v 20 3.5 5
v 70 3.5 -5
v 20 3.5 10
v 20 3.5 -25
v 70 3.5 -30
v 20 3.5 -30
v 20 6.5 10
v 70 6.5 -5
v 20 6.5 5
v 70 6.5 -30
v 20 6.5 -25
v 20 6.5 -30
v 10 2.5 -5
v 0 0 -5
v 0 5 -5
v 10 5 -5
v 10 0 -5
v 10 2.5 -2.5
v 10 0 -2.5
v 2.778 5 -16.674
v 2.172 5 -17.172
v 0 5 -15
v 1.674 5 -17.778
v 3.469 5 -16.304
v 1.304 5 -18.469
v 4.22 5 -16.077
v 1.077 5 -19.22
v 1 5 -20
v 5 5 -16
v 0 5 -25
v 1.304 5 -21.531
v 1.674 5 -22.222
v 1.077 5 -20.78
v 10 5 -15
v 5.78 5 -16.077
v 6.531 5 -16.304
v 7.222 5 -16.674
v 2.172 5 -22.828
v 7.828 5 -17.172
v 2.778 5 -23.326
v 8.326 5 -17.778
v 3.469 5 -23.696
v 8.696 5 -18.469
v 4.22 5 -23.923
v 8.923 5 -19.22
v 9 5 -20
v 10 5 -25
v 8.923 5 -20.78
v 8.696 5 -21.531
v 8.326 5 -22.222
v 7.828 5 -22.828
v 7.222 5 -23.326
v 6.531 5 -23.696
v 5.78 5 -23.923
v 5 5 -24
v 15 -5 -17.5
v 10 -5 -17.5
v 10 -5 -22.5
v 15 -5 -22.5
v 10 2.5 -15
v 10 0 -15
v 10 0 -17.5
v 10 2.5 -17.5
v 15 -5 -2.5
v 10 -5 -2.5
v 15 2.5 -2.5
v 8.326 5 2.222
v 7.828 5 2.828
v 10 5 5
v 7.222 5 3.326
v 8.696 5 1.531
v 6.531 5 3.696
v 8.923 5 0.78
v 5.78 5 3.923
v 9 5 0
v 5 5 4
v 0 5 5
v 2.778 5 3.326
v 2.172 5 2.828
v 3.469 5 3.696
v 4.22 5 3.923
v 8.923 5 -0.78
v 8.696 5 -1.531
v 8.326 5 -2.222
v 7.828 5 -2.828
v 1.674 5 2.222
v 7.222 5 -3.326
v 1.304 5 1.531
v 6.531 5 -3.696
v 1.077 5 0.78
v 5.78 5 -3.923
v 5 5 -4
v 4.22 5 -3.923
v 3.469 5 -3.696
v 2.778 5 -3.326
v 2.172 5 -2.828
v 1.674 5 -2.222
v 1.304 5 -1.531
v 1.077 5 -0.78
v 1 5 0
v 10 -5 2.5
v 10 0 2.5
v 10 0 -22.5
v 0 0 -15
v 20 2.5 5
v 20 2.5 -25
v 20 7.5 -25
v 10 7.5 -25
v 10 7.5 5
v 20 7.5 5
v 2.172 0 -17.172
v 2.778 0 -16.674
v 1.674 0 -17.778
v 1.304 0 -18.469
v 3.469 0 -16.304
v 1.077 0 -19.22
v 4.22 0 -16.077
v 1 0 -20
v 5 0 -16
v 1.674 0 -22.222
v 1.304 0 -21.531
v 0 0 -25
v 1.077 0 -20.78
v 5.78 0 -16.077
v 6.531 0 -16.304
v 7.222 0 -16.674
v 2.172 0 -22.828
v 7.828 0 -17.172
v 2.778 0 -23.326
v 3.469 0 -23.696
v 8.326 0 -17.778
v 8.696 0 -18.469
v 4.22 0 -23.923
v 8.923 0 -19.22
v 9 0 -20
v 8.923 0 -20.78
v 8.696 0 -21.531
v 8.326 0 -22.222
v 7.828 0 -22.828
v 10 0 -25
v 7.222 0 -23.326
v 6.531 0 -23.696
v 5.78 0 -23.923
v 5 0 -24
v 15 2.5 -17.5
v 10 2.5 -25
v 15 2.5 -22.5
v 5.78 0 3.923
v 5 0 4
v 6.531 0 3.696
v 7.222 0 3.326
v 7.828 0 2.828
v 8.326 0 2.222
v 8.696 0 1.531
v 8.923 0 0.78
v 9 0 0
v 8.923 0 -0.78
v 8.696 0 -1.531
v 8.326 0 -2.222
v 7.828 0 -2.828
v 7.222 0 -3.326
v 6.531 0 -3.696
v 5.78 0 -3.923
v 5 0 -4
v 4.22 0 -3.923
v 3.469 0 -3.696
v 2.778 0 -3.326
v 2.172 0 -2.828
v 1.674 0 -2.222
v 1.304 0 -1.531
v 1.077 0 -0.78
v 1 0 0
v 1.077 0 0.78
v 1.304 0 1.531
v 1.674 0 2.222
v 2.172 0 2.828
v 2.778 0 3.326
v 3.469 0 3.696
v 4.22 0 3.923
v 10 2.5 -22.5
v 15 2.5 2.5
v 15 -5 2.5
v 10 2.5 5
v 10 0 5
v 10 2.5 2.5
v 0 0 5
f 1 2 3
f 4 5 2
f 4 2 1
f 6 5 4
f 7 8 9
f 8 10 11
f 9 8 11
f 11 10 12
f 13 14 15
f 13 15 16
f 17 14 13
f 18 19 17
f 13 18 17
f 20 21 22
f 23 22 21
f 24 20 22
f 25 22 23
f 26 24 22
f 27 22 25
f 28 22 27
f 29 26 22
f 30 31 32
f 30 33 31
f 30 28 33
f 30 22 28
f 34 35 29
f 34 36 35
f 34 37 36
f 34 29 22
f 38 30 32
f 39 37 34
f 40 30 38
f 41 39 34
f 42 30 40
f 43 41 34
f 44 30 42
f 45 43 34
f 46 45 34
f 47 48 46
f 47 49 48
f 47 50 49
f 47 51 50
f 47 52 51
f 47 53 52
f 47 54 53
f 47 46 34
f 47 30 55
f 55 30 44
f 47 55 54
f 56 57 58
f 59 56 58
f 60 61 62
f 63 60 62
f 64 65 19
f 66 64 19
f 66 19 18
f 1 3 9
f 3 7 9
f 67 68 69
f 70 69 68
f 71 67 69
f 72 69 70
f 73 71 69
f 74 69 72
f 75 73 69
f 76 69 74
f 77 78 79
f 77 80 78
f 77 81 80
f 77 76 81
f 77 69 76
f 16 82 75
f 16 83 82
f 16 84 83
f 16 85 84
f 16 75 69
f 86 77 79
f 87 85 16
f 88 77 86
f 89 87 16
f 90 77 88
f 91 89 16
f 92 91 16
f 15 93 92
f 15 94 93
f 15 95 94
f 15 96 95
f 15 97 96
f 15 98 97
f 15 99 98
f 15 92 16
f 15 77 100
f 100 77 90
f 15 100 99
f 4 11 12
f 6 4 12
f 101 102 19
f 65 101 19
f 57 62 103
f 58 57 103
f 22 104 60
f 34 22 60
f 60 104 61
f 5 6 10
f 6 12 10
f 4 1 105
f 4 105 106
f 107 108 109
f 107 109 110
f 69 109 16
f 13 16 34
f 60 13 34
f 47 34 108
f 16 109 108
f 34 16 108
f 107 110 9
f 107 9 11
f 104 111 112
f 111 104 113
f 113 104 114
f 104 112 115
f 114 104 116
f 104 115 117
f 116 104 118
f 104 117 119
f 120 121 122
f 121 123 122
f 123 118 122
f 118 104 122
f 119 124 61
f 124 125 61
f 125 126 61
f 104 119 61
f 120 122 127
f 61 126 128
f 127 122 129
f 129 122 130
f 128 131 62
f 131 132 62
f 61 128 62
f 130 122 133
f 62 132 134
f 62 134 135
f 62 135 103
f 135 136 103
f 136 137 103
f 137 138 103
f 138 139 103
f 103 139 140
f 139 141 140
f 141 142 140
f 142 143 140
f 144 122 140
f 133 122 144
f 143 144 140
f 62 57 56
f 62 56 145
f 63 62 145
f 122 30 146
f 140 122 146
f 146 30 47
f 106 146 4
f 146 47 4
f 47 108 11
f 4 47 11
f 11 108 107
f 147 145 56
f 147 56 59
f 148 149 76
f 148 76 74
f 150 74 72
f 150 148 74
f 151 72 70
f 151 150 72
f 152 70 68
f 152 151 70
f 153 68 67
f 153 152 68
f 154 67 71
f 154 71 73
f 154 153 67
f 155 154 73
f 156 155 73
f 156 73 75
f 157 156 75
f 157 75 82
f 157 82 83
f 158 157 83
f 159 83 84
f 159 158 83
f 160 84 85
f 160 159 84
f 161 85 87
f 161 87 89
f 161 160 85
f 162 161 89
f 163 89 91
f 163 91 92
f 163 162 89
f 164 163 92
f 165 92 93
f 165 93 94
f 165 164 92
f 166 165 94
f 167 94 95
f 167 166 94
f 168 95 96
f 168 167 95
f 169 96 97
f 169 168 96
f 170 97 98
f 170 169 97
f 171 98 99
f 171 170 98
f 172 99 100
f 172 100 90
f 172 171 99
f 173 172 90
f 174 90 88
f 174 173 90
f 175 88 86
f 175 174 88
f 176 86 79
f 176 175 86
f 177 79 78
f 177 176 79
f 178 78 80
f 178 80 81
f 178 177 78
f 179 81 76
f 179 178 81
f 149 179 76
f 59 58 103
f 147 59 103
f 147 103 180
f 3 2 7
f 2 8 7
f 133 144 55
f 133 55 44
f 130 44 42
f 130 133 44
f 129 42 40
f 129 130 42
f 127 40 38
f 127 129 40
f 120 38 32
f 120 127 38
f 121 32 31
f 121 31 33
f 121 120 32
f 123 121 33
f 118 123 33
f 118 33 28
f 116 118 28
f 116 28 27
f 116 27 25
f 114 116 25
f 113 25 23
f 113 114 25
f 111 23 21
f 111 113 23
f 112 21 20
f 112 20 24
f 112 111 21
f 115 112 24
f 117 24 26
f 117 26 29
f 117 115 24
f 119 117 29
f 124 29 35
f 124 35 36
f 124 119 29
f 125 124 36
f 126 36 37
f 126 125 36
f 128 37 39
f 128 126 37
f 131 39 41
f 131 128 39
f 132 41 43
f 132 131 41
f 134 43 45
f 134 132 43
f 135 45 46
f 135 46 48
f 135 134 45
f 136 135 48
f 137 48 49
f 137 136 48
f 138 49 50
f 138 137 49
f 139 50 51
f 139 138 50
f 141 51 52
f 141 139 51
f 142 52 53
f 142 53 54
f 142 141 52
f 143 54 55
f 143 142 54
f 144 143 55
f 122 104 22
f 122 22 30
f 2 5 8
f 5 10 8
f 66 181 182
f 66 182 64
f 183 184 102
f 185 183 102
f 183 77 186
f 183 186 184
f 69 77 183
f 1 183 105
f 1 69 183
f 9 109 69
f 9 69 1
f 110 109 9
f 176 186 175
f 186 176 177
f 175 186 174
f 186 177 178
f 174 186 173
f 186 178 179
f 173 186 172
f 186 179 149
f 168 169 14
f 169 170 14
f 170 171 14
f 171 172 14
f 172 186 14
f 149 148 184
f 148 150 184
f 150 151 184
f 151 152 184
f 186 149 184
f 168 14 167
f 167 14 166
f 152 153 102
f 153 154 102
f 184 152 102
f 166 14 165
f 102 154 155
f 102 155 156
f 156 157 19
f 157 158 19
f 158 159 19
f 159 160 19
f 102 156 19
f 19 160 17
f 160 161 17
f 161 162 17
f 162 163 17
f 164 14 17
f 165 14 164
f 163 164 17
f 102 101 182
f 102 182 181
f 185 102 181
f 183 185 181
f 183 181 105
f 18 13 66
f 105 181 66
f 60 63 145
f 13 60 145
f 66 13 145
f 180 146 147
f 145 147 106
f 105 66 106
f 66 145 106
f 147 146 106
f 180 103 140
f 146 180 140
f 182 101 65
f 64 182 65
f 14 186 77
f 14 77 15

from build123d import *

# Parameters (mm, degrees)
SKETCH1_W             = 10
SKETCH1_H             = 10
SKETCH1_R             = 4
BOSS_EXTRUDE1_DEPTH   = 5
BOSS_EXTRUDE1_2_DEPTH = 5
SKETCH2_W             = 5
SKETCH2_H             = 10
BOSS_EXTRUDE2_DEPTH   = 5
SKETCH4_W             = 10
SKETCH4_H             = 30
BOSS_EXTRUDE4_DEPTH   = 2.5
BOSS_EXTRUDE7_DEPTH   = 1.5


with BuildPart() as part:
    # Sketch1 → Boss-Extrude1 (new body)
    with BuildSketch(Plane(origin=(0, 0, 0), x_dir=(1, 0, 0), z_dir=(0, 1, 0))):
        with Locations((5, 0)):
            Rectangle(SKETCH1_W, SKETCH1_H)
        with Locations(Location((5, 0, 0), (0, 0, 270))):
            Circle(SKETCH1_R, mode=Mode.SUBTRACT)
    extrude(amount=BOSS_EXTRUDE1_DEPTH)

    # Sketch2 → Boss-Extrude2 (add)
    with BuildSketch(Plane(origin=(10, 0, 0), x_dir=(0, 0, -1), z_dir=(1, 0, 0))):
        Rectangle(SKETCH2_W, SKETCH2_H)
        with Locations((20, 0)):
            Rectangle(SKETCH2_W, SKETCH2_H)
    extrude(amount=BOSS_EXTRUDE2_DEPTH)


with BuildPart() as body_2:
    # Sketch1 → Boss-Extrude1 2 (new body)
    with BuildSketch(Plane(origin=(0, 0, 0), x_dir=(1, 0, 0), z_dir=(0, 1, 0))):
        with Locations((5, 20)):
            Rectangle(SKETCH1_W, SKETCH1_H)
        with Locations(Location((5, 20, 0), (0, 0, 90))):
            Circle(SKETCH1_R, mode=Mode.SUBTRACT)
    extrude(amount=BOSS_EXTRUDE1_2_DEPTH)



with BuildPart() as boss_extrude2_piece_1:
    # of the separate pieces the step leaves, piece 1, a body of its own (boss_extrude2_pieces)
    add(part.part.solids().sort_by_distance((0, 0, -5))[0])

    # Sketch4 → Boss-Extrude4 (add, symmetric)
    with BuildSketch(Plane(origin=(0, 5, 0), x_dir=(1, 0, 0), z_dir=(0, 1, 0))):
        with Locations((15, 10)):
            Rectangle(SKETCH4_W, SKETCH4_H)
    extrude(amount=BOSS_EXTRUDE4_DEPTH, both=True)


with BuildPart() as boss_extrude2_piece_2:
    # of the separate pieces the step leaves, piece 2, a body of its own (boss_extrude2_pieces)
    add(part.part.solids().sort_by_distance((10, -5, -17.5))[0])


with BuildPart() as body_2_1:
    add(body_2.part)

    add(boss_extrude2_piece_1.part)  # Boss-Extrude7 merges Boss-Extrude2 piece 1

    add(boss_extrude2_piece_2.part)  # Boss-Extrude7 merges Boss-Extrude2 piece 2
    # Sketch8 → Boss-Extrude7 (add, symmetric)
    with BuildSketch(Plane(origin=(0, 5, 0), x_dir=(1, 0, 0), z_dir=(0, 1, 0))):
        Polygon((20, 25), (20, 30), (70, 30), (70, 5), (20, -10), (20, -5), (10, -5), (10, 25), align=None)
    extrude(amount=BOSS_EXTRUDE7_DEPTH, both=True)


solid = body_2_1.part
